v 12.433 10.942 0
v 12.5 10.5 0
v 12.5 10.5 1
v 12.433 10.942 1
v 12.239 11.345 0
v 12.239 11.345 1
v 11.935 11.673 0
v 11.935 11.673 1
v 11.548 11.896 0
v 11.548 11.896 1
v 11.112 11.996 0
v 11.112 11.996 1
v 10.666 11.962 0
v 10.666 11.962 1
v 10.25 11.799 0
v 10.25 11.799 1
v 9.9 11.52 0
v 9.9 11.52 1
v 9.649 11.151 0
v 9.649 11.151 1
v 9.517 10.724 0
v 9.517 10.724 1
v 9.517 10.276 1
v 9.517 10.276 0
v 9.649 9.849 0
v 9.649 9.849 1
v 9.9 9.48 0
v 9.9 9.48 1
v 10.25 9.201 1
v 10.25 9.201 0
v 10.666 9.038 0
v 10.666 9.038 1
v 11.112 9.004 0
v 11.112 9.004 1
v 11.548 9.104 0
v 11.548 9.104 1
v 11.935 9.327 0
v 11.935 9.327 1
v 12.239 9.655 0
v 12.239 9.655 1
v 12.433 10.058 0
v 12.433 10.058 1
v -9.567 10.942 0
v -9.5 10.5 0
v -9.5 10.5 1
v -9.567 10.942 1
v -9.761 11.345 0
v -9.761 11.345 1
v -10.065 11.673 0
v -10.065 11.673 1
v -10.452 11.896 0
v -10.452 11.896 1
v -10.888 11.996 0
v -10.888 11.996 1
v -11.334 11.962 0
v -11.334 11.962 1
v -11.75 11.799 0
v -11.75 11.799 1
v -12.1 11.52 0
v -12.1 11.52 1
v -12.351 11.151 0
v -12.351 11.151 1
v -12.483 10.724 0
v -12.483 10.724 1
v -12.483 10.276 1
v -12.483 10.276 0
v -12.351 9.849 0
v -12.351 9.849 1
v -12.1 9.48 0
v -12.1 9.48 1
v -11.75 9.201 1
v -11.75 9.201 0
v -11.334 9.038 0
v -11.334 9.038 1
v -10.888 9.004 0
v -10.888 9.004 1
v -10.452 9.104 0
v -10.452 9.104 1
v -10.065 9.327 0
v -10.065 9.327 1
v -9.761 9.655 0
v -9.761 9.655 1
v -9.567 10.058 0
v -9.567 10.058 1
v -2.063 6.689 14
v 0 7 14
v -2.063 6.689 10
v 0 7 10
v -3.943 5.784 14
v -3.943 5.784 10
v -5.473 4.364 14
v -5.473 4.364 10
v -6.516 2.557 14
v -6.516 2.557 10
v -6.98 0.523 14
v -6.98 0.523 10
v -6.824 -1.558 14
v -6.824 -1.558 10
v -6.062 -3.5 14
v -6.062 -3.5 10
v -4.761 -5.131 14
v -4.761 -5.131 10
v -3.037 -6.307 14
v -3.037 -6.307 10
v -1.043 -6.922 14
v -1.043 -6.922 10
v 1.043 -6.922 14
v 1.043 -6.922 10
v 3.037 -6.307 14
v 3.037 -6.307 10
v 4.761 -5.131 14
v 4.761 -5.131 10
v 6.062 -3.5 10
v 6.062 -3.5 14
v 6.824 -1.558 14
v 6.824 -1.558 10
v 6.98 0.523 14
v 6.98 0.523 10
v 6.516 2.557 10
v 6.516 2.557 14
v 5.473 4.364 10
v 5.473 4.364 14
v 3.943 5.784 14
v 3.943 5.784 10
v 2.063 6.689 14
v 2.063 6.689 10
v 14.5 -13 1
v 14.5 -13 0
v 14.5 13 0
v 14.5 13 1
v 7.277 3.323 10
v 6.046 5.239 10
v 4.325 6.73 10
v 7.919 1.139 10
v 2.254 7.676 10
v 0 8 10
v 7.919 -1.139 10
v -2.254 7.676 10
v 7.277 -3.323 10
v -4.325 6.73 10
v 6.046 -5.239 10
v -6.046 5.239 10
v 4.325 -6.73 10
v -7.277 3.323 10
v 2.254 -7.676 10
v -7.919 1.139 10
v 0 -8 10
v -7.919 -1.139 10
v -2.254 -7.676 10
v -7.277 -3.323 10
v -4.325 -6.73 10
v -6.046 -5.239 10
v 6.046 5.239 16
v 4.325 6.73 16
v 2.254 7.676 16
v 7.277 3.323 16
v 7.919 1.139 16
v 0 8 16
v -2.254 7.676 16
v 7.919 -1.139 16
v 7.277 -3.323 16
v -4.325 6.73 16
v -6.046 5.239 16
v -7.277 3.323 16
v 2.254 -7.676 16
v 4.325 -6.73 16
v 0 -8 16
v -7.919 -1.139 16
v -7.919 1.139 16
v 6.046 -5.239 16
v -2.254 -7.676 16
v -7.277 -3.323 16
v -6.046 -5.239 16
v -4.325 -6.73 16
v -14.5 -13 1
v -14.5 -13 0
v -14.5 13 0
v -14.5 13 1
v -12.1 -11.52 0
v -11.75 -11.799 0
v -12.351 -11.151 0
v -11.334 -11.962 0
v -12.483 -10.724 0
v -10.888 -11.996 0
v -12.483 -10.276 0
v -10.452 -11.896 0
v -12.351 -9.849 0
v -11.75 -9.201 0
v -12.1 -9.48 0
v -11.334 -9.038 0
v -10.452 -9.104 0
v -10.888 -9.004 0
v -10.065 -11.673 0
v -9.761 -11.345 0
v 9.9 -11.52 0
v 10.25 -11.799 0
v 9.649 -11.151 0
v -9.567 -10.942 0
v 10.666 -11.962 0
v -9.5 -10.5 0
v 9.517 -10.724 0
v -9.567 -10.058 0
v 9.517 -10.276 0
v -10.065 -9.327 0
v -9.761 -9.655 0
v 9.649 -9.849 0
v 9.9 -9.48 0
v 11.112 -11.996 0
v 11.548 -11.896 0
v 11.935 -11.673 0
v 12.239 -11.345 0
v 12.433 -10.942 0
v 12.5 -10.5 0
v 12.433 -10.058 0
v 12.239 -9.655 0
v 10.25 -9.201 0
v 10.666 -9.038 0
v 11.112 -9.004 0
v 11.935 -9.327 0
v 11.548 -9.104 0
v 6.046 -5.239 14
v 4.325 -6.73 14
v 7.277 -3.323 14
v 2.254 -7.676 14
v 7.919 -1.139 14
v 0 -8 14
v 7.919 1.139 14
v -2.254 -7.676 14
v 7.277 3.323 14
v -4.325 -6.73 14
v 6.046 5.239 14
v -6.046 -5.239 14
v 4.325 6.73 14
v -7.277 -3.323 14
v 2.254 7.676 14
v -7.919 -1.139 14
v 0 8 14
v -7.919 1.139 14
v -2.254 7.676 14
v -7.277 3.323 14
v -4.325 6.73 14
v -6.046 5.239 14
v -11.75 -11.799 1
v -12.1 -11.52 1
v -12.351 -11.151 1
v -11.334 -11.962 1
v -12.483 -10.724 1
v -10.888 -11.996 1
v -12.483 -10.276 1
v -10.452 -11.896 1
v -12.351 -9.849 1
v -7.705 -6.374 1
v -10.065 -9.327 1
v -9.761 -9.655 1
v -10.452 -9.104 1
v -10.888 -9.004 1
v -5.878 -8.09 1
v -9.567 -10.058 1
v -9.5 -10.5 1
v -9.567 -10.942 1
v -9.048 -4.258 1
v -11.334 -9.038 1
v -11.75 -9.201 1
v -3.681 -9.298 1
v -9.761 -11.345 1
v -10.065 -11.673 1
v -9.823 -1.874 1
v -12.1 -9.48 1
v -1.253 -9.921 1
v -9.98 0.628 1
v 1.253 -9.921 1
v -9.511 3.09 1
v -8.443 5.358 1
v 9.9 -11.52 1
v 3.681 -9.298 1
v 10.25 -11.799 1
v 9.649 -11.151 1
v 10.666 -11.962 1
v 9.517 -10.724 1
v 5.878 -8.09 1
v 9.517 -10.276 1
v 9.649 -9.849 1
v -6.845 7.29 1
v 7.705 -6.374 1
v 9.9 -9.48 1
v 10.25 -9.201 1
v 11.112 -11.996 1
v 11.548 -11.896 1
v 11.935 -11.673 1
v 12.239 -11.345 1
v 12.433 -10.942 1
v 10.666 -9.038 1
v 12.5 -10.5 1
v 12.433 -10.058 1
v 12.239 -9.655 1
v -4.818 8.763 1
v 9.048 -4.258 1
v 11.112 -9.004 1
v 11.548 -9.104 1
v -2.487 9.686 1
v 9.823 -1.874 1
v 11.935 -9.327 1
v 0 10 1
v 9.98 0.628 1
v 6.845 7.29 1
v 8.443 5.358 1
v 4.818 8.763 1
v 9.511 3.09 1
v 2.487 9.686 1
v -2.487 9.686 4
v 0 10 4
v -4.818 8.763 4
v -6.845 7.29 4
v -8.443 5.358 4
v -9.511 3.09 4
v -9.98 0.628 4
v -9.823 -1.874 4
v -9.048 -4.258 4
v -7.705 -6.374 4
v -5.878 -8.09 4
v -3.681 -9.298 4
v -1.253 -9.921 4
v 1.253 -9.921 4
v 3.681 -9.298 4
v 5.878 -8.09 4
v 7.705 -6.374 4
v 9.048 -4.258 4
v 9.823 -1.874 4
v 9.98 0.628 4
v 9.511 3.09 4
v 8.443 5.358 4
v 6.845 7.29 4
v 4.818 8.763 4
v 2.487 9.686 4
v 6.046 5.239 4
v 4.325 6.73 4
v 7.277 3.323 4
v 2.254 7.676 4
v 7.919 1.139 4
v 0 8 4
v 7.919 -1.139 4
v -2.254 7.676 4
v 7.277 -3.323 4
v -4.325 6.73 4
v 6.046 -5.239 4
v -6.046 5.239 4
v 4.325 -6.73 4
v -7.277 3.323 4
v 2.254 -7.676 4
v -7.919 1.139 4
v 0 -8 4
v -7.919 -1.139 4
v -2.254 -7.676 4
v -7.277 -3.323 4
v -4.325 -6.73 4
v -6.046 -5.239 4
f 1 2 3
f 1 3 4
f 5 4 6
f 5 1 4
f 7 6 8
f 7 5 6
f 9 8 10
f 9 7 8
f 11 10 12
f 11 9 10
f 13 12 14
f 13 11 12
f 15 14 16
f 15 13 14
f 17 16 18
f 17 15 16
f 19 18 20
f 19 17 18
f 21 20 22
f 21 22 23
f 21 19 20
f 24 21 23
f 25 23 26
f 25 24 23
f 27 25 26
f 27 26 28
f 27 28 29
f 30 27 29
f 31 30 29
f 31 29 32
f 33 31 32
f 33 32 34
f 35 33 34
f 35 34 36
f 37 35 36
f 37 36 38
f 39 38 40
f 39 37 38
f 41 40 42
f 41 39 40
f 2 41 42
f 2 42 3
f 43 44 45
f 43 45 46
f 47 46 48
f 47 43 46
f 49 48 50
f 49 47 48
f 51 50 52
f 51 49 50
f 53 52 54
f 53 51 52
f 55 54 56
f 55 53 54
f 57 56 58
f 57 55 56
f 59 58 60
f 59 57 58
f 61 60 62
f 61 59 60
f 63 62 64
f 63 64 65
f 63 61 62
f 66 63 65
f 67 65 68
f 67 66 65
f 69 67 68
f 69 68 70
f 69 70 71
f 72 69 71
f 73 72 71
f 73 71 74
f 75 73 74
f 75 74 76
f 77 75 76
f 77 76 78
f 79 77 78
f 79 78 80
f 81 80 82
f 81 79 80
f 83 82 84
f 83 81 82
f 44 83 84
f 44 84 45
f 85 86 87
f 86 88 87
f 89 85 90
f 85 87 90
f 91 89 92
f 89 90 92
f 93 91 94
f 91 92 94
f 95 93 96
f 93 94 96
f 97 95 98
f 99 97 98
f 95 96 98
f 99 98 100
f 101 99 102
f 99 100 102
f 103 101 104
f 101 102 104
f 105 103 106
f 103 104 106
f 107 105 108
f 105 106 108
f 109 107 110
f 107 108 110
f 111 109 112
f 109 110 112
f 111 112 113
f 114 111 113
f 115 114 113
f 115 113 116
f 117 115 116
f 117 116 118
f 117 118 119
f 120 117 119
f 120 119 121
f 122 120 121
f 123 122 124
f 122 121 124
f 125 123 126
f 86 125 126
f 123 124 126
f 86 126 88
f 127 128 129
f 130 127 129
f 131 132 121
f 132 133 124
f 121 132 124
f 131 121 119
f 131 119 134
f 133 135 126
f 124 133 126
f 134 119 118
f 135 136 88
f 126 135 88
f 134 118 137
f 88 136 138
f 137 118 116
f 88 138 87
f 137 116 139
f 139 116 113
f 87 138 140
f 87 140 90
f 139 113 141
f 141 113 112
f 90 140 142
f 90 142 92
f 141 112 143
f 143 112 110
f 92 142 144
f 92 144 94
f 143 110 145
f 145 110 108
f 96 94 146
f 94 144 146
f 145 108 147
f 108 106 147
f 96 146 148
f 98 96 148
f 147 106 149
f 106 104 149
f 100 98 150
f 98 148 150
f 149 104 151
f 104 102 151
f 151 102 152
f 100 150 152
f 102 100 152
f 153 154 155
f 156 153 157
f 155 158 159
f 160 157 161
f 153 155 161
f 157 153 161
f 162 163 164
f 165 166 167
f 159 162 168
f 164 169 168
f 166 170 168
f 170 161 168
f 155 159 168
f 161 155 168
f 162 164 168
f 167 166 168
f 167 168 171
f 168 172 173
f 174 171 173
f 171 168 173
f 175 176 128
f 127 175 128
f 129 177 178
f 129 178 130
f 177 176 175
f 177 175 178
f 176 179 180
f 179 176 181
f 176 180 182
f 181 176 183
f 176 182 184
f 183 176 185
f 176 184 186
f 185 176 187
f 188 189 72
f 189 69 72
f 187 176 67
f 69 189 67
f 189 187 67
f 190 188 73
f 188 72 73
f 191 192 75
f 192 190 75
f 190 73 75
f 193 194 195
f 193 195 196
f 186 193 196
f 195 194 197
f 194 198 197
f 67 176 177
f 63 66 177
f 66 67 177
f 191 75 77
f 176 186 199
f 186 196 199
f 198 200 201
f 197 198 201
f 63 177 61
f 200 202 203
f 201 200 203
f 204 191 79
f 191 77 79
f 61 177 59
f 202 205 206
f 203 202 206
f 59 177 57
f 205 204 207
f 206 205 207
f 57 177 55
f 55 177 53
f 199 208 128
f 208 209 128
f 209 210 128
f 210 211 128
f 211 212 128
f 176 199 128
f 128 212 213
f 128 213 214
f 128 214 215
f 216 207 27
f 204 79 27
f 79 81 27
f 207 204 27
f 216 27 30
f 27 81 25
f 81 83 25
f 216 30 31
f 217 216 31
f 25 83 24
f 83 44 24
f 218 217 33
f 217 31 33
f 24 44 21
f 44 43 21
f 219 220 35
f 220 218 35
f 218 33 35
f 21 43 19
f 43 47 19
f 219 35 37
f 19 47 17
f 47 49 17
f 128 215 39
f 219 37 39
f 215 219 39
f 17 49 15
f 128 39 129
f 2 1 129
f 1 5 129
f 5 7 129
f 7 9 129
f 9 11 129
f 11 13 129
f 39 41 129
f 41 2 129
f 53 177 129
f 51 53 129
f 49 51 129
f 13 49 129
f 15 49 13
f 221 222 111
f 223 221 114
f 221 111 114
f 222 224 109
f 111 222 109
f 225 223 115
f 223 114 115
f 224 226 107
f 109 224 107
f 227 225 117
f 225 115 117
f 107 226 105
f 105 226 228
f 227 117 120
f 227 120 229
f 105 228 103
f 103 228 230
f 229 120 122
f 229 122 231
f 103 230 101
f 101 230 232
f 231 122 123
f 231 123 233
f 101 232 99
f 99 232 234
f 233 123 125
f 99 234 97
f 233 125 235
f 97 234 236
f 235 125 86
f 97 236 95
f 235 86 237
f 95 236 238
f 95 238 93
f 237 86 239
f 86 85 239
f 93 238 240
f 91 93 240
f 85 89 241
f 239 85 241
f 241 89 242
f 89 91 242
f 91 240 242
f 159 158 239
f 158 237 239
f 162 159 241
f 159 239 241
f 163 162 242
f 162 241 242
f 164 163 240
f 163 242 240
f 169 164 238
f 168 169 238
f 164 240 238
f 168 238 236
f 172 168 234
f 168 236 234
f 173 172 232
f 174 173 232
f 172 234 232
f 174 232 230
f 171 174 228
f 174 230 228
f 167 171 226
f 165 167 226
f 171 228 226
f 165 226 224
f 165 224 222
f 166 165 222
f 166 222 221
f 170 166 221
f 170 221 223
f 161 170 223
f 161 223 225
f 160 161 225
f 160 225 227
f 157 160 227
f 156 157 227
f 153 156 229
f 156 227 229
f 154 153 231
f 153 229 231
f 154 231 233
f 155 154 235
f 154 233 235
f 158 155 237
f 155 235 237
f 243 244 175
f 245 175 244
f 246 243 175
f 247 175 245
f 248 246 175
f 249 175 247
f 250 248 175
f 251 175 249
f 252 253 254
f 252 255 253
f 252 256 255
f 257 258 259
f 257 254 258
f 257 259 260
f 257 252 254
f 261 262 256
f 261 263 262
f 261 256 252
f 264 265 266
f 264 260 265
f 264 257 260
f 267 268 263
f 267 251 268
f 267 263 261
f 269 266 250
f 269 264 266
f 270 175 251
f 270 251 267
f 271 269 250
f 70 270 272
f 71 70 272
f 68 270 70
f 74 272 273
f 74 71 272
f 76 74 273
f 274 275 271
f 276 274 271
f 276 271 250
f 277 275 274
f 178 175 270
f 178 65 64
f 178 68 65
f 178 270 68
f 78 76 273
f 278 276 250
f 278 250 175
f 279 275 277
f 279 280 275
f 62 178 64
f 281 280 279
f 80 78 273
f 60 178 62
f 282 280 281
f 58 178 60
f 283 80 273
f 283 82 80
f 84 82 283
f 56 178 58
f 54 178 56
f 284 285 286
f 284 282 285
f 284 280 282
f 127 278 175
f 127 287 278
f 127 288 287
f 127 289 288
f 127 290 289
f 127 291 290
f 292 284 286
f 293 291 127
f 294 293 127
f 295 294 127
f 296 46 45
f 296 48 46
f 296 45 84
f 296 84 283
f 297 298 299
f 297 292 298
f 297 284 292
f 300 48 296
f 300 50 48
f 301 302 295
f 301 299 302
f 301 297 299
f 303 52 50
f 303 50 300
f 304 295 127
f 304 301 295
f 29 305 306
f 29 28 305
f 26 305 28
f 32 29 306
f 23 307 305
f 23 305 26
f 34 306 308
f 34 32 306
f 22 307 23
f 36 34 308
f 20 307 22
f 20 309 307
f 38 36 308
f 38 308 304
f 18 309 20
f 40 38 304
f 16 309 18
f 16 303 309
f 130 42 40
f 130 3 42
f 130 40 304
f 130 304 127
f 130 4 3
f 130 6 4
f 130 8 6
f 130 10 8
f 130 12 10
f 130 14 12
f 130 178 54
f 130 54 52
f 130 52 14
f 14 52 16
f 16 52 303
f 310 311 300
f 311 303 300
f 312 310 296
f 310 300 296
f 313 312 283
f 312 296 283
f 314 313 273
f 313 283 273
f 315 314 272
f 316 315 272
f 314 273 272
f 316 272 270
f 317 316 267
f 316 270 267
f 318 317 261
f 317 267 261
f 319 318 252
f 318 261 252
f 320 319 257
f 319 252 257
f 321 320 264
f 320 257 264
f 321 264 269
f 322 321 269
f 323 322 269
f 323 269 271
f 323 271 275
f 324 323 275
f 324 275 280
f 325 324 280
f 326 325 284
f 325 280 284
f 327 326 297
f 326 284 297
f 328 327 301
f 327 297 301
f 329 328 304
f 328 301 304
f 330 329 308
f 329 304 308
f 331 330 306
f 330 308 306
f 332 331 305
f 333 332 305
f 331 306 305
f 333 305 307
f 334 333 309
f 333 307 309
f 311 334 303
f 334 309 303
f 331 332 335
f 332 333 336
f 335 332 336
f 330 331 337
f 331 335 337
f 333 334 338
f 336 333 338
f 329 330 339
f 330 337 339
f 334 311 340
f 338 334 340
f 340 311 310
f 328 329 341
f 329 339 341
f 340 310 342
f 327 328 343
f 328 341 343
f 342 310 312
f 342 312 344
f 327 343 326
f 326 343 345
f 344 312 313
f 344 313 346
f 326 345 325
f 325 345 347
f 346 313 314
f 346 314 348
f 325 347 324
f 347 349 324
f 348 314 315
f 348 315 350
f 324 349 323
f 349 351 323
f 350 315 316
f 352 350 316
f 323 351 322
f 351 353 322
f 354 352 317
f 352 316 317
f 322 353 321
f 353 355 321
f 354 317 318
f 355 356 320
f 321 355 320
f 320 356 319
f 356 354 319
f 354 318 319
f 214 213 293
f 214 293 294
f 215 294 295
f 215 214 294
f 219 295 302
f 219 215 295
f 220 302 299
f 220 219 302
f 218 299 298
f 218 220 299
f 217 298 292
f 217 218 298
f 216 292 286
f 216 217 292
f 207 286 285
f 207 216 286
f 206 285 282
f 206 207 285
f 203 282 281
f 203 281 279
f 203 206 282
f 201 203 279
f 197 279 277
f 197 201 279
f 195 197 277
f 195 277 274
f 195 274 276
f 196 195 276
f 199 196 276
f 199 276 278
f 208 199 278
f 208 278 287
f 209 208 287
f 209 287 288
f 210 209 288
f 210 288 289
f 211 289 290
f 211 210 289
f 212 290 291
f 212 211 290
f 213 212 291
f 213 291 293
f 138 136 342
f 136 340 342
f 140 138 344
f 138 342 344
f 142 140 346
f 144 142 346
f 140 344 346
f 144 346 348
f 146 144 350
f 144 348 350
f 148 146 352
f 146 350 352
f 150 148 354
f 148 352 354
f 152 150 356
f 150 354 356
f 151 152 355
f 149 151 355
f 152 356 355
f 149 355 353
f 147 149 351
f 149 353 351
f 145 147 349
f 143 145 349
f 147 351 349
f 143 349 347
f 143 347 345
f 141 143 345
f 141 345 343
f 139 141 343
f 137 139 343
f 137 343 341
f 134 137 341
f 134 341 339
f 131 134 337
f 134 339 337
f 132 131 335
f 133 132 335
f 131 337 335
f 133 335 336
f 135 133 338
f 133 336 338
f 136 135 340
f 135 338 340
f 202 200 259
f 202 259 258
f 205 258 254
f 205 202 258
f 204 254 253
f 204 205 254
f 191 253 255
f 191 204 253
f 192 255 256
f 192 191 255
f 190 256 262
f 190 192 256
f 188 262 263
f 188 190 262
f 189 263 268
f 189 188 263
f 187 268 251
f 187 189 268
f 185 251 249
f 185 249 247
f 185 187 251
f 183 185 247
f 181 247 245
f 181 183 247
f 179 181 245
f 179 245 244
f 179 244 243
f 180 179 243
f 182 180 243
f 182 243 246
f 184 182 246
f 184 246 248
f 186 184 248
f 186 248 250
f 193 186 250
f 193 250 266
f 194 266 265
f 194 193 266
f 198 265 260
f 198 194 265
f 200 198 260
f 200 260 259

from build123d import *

# Parameters (mm, degrees)
SKETCH_1_W      = 29
SKETCH_1_H      = 26
SKETCH_1_R      = 1.5
EXTRUDE_1_DEPTH = 1


with BuildPart() as part:
    # 草图1 → 凸台-拉伸1 (new body)
    with BuildSketch(Plane.XY):
        Rectangle(SKETCH_1_W, SKETCH_1_H)
        with Locations((-11, 10.5)):
            Circle(SKETCH_1_R, mode=Mode.SUBTRACT)
        with Locations((11, 10.5)):
            Circle(SKETCH_1_R, mode=Mode.SUBTRACT)
        with Locations((11, -10.5)):
            Circle(SKETCH_1_R, mode=Mode.SUBTRACT)
        with Locations((-11, -10.5)):
            Circle(SKETCH_1_R, mode=Mode.SUBTRACT)
    extrude(amount=EXTRUDE_1_DEPTH)

    # 草图2 → 旋转2 (revolve)
    with BuildSketch(Plane(origin=(0, 0, 0), x_dir=(0, 0, -1), z_dir=(1, 0, 0))):
        Polygon((-1, 0), (-16, 0), (-16, 8), (-14, 8), (-14, 7), (-10, 7), (-10, 8), (-4, 8), (-4, 10), (-1, 10), align=None)
    revolve(axis=Axis((0, 0, 1), (0, 0, 1)))


solid = part.part
